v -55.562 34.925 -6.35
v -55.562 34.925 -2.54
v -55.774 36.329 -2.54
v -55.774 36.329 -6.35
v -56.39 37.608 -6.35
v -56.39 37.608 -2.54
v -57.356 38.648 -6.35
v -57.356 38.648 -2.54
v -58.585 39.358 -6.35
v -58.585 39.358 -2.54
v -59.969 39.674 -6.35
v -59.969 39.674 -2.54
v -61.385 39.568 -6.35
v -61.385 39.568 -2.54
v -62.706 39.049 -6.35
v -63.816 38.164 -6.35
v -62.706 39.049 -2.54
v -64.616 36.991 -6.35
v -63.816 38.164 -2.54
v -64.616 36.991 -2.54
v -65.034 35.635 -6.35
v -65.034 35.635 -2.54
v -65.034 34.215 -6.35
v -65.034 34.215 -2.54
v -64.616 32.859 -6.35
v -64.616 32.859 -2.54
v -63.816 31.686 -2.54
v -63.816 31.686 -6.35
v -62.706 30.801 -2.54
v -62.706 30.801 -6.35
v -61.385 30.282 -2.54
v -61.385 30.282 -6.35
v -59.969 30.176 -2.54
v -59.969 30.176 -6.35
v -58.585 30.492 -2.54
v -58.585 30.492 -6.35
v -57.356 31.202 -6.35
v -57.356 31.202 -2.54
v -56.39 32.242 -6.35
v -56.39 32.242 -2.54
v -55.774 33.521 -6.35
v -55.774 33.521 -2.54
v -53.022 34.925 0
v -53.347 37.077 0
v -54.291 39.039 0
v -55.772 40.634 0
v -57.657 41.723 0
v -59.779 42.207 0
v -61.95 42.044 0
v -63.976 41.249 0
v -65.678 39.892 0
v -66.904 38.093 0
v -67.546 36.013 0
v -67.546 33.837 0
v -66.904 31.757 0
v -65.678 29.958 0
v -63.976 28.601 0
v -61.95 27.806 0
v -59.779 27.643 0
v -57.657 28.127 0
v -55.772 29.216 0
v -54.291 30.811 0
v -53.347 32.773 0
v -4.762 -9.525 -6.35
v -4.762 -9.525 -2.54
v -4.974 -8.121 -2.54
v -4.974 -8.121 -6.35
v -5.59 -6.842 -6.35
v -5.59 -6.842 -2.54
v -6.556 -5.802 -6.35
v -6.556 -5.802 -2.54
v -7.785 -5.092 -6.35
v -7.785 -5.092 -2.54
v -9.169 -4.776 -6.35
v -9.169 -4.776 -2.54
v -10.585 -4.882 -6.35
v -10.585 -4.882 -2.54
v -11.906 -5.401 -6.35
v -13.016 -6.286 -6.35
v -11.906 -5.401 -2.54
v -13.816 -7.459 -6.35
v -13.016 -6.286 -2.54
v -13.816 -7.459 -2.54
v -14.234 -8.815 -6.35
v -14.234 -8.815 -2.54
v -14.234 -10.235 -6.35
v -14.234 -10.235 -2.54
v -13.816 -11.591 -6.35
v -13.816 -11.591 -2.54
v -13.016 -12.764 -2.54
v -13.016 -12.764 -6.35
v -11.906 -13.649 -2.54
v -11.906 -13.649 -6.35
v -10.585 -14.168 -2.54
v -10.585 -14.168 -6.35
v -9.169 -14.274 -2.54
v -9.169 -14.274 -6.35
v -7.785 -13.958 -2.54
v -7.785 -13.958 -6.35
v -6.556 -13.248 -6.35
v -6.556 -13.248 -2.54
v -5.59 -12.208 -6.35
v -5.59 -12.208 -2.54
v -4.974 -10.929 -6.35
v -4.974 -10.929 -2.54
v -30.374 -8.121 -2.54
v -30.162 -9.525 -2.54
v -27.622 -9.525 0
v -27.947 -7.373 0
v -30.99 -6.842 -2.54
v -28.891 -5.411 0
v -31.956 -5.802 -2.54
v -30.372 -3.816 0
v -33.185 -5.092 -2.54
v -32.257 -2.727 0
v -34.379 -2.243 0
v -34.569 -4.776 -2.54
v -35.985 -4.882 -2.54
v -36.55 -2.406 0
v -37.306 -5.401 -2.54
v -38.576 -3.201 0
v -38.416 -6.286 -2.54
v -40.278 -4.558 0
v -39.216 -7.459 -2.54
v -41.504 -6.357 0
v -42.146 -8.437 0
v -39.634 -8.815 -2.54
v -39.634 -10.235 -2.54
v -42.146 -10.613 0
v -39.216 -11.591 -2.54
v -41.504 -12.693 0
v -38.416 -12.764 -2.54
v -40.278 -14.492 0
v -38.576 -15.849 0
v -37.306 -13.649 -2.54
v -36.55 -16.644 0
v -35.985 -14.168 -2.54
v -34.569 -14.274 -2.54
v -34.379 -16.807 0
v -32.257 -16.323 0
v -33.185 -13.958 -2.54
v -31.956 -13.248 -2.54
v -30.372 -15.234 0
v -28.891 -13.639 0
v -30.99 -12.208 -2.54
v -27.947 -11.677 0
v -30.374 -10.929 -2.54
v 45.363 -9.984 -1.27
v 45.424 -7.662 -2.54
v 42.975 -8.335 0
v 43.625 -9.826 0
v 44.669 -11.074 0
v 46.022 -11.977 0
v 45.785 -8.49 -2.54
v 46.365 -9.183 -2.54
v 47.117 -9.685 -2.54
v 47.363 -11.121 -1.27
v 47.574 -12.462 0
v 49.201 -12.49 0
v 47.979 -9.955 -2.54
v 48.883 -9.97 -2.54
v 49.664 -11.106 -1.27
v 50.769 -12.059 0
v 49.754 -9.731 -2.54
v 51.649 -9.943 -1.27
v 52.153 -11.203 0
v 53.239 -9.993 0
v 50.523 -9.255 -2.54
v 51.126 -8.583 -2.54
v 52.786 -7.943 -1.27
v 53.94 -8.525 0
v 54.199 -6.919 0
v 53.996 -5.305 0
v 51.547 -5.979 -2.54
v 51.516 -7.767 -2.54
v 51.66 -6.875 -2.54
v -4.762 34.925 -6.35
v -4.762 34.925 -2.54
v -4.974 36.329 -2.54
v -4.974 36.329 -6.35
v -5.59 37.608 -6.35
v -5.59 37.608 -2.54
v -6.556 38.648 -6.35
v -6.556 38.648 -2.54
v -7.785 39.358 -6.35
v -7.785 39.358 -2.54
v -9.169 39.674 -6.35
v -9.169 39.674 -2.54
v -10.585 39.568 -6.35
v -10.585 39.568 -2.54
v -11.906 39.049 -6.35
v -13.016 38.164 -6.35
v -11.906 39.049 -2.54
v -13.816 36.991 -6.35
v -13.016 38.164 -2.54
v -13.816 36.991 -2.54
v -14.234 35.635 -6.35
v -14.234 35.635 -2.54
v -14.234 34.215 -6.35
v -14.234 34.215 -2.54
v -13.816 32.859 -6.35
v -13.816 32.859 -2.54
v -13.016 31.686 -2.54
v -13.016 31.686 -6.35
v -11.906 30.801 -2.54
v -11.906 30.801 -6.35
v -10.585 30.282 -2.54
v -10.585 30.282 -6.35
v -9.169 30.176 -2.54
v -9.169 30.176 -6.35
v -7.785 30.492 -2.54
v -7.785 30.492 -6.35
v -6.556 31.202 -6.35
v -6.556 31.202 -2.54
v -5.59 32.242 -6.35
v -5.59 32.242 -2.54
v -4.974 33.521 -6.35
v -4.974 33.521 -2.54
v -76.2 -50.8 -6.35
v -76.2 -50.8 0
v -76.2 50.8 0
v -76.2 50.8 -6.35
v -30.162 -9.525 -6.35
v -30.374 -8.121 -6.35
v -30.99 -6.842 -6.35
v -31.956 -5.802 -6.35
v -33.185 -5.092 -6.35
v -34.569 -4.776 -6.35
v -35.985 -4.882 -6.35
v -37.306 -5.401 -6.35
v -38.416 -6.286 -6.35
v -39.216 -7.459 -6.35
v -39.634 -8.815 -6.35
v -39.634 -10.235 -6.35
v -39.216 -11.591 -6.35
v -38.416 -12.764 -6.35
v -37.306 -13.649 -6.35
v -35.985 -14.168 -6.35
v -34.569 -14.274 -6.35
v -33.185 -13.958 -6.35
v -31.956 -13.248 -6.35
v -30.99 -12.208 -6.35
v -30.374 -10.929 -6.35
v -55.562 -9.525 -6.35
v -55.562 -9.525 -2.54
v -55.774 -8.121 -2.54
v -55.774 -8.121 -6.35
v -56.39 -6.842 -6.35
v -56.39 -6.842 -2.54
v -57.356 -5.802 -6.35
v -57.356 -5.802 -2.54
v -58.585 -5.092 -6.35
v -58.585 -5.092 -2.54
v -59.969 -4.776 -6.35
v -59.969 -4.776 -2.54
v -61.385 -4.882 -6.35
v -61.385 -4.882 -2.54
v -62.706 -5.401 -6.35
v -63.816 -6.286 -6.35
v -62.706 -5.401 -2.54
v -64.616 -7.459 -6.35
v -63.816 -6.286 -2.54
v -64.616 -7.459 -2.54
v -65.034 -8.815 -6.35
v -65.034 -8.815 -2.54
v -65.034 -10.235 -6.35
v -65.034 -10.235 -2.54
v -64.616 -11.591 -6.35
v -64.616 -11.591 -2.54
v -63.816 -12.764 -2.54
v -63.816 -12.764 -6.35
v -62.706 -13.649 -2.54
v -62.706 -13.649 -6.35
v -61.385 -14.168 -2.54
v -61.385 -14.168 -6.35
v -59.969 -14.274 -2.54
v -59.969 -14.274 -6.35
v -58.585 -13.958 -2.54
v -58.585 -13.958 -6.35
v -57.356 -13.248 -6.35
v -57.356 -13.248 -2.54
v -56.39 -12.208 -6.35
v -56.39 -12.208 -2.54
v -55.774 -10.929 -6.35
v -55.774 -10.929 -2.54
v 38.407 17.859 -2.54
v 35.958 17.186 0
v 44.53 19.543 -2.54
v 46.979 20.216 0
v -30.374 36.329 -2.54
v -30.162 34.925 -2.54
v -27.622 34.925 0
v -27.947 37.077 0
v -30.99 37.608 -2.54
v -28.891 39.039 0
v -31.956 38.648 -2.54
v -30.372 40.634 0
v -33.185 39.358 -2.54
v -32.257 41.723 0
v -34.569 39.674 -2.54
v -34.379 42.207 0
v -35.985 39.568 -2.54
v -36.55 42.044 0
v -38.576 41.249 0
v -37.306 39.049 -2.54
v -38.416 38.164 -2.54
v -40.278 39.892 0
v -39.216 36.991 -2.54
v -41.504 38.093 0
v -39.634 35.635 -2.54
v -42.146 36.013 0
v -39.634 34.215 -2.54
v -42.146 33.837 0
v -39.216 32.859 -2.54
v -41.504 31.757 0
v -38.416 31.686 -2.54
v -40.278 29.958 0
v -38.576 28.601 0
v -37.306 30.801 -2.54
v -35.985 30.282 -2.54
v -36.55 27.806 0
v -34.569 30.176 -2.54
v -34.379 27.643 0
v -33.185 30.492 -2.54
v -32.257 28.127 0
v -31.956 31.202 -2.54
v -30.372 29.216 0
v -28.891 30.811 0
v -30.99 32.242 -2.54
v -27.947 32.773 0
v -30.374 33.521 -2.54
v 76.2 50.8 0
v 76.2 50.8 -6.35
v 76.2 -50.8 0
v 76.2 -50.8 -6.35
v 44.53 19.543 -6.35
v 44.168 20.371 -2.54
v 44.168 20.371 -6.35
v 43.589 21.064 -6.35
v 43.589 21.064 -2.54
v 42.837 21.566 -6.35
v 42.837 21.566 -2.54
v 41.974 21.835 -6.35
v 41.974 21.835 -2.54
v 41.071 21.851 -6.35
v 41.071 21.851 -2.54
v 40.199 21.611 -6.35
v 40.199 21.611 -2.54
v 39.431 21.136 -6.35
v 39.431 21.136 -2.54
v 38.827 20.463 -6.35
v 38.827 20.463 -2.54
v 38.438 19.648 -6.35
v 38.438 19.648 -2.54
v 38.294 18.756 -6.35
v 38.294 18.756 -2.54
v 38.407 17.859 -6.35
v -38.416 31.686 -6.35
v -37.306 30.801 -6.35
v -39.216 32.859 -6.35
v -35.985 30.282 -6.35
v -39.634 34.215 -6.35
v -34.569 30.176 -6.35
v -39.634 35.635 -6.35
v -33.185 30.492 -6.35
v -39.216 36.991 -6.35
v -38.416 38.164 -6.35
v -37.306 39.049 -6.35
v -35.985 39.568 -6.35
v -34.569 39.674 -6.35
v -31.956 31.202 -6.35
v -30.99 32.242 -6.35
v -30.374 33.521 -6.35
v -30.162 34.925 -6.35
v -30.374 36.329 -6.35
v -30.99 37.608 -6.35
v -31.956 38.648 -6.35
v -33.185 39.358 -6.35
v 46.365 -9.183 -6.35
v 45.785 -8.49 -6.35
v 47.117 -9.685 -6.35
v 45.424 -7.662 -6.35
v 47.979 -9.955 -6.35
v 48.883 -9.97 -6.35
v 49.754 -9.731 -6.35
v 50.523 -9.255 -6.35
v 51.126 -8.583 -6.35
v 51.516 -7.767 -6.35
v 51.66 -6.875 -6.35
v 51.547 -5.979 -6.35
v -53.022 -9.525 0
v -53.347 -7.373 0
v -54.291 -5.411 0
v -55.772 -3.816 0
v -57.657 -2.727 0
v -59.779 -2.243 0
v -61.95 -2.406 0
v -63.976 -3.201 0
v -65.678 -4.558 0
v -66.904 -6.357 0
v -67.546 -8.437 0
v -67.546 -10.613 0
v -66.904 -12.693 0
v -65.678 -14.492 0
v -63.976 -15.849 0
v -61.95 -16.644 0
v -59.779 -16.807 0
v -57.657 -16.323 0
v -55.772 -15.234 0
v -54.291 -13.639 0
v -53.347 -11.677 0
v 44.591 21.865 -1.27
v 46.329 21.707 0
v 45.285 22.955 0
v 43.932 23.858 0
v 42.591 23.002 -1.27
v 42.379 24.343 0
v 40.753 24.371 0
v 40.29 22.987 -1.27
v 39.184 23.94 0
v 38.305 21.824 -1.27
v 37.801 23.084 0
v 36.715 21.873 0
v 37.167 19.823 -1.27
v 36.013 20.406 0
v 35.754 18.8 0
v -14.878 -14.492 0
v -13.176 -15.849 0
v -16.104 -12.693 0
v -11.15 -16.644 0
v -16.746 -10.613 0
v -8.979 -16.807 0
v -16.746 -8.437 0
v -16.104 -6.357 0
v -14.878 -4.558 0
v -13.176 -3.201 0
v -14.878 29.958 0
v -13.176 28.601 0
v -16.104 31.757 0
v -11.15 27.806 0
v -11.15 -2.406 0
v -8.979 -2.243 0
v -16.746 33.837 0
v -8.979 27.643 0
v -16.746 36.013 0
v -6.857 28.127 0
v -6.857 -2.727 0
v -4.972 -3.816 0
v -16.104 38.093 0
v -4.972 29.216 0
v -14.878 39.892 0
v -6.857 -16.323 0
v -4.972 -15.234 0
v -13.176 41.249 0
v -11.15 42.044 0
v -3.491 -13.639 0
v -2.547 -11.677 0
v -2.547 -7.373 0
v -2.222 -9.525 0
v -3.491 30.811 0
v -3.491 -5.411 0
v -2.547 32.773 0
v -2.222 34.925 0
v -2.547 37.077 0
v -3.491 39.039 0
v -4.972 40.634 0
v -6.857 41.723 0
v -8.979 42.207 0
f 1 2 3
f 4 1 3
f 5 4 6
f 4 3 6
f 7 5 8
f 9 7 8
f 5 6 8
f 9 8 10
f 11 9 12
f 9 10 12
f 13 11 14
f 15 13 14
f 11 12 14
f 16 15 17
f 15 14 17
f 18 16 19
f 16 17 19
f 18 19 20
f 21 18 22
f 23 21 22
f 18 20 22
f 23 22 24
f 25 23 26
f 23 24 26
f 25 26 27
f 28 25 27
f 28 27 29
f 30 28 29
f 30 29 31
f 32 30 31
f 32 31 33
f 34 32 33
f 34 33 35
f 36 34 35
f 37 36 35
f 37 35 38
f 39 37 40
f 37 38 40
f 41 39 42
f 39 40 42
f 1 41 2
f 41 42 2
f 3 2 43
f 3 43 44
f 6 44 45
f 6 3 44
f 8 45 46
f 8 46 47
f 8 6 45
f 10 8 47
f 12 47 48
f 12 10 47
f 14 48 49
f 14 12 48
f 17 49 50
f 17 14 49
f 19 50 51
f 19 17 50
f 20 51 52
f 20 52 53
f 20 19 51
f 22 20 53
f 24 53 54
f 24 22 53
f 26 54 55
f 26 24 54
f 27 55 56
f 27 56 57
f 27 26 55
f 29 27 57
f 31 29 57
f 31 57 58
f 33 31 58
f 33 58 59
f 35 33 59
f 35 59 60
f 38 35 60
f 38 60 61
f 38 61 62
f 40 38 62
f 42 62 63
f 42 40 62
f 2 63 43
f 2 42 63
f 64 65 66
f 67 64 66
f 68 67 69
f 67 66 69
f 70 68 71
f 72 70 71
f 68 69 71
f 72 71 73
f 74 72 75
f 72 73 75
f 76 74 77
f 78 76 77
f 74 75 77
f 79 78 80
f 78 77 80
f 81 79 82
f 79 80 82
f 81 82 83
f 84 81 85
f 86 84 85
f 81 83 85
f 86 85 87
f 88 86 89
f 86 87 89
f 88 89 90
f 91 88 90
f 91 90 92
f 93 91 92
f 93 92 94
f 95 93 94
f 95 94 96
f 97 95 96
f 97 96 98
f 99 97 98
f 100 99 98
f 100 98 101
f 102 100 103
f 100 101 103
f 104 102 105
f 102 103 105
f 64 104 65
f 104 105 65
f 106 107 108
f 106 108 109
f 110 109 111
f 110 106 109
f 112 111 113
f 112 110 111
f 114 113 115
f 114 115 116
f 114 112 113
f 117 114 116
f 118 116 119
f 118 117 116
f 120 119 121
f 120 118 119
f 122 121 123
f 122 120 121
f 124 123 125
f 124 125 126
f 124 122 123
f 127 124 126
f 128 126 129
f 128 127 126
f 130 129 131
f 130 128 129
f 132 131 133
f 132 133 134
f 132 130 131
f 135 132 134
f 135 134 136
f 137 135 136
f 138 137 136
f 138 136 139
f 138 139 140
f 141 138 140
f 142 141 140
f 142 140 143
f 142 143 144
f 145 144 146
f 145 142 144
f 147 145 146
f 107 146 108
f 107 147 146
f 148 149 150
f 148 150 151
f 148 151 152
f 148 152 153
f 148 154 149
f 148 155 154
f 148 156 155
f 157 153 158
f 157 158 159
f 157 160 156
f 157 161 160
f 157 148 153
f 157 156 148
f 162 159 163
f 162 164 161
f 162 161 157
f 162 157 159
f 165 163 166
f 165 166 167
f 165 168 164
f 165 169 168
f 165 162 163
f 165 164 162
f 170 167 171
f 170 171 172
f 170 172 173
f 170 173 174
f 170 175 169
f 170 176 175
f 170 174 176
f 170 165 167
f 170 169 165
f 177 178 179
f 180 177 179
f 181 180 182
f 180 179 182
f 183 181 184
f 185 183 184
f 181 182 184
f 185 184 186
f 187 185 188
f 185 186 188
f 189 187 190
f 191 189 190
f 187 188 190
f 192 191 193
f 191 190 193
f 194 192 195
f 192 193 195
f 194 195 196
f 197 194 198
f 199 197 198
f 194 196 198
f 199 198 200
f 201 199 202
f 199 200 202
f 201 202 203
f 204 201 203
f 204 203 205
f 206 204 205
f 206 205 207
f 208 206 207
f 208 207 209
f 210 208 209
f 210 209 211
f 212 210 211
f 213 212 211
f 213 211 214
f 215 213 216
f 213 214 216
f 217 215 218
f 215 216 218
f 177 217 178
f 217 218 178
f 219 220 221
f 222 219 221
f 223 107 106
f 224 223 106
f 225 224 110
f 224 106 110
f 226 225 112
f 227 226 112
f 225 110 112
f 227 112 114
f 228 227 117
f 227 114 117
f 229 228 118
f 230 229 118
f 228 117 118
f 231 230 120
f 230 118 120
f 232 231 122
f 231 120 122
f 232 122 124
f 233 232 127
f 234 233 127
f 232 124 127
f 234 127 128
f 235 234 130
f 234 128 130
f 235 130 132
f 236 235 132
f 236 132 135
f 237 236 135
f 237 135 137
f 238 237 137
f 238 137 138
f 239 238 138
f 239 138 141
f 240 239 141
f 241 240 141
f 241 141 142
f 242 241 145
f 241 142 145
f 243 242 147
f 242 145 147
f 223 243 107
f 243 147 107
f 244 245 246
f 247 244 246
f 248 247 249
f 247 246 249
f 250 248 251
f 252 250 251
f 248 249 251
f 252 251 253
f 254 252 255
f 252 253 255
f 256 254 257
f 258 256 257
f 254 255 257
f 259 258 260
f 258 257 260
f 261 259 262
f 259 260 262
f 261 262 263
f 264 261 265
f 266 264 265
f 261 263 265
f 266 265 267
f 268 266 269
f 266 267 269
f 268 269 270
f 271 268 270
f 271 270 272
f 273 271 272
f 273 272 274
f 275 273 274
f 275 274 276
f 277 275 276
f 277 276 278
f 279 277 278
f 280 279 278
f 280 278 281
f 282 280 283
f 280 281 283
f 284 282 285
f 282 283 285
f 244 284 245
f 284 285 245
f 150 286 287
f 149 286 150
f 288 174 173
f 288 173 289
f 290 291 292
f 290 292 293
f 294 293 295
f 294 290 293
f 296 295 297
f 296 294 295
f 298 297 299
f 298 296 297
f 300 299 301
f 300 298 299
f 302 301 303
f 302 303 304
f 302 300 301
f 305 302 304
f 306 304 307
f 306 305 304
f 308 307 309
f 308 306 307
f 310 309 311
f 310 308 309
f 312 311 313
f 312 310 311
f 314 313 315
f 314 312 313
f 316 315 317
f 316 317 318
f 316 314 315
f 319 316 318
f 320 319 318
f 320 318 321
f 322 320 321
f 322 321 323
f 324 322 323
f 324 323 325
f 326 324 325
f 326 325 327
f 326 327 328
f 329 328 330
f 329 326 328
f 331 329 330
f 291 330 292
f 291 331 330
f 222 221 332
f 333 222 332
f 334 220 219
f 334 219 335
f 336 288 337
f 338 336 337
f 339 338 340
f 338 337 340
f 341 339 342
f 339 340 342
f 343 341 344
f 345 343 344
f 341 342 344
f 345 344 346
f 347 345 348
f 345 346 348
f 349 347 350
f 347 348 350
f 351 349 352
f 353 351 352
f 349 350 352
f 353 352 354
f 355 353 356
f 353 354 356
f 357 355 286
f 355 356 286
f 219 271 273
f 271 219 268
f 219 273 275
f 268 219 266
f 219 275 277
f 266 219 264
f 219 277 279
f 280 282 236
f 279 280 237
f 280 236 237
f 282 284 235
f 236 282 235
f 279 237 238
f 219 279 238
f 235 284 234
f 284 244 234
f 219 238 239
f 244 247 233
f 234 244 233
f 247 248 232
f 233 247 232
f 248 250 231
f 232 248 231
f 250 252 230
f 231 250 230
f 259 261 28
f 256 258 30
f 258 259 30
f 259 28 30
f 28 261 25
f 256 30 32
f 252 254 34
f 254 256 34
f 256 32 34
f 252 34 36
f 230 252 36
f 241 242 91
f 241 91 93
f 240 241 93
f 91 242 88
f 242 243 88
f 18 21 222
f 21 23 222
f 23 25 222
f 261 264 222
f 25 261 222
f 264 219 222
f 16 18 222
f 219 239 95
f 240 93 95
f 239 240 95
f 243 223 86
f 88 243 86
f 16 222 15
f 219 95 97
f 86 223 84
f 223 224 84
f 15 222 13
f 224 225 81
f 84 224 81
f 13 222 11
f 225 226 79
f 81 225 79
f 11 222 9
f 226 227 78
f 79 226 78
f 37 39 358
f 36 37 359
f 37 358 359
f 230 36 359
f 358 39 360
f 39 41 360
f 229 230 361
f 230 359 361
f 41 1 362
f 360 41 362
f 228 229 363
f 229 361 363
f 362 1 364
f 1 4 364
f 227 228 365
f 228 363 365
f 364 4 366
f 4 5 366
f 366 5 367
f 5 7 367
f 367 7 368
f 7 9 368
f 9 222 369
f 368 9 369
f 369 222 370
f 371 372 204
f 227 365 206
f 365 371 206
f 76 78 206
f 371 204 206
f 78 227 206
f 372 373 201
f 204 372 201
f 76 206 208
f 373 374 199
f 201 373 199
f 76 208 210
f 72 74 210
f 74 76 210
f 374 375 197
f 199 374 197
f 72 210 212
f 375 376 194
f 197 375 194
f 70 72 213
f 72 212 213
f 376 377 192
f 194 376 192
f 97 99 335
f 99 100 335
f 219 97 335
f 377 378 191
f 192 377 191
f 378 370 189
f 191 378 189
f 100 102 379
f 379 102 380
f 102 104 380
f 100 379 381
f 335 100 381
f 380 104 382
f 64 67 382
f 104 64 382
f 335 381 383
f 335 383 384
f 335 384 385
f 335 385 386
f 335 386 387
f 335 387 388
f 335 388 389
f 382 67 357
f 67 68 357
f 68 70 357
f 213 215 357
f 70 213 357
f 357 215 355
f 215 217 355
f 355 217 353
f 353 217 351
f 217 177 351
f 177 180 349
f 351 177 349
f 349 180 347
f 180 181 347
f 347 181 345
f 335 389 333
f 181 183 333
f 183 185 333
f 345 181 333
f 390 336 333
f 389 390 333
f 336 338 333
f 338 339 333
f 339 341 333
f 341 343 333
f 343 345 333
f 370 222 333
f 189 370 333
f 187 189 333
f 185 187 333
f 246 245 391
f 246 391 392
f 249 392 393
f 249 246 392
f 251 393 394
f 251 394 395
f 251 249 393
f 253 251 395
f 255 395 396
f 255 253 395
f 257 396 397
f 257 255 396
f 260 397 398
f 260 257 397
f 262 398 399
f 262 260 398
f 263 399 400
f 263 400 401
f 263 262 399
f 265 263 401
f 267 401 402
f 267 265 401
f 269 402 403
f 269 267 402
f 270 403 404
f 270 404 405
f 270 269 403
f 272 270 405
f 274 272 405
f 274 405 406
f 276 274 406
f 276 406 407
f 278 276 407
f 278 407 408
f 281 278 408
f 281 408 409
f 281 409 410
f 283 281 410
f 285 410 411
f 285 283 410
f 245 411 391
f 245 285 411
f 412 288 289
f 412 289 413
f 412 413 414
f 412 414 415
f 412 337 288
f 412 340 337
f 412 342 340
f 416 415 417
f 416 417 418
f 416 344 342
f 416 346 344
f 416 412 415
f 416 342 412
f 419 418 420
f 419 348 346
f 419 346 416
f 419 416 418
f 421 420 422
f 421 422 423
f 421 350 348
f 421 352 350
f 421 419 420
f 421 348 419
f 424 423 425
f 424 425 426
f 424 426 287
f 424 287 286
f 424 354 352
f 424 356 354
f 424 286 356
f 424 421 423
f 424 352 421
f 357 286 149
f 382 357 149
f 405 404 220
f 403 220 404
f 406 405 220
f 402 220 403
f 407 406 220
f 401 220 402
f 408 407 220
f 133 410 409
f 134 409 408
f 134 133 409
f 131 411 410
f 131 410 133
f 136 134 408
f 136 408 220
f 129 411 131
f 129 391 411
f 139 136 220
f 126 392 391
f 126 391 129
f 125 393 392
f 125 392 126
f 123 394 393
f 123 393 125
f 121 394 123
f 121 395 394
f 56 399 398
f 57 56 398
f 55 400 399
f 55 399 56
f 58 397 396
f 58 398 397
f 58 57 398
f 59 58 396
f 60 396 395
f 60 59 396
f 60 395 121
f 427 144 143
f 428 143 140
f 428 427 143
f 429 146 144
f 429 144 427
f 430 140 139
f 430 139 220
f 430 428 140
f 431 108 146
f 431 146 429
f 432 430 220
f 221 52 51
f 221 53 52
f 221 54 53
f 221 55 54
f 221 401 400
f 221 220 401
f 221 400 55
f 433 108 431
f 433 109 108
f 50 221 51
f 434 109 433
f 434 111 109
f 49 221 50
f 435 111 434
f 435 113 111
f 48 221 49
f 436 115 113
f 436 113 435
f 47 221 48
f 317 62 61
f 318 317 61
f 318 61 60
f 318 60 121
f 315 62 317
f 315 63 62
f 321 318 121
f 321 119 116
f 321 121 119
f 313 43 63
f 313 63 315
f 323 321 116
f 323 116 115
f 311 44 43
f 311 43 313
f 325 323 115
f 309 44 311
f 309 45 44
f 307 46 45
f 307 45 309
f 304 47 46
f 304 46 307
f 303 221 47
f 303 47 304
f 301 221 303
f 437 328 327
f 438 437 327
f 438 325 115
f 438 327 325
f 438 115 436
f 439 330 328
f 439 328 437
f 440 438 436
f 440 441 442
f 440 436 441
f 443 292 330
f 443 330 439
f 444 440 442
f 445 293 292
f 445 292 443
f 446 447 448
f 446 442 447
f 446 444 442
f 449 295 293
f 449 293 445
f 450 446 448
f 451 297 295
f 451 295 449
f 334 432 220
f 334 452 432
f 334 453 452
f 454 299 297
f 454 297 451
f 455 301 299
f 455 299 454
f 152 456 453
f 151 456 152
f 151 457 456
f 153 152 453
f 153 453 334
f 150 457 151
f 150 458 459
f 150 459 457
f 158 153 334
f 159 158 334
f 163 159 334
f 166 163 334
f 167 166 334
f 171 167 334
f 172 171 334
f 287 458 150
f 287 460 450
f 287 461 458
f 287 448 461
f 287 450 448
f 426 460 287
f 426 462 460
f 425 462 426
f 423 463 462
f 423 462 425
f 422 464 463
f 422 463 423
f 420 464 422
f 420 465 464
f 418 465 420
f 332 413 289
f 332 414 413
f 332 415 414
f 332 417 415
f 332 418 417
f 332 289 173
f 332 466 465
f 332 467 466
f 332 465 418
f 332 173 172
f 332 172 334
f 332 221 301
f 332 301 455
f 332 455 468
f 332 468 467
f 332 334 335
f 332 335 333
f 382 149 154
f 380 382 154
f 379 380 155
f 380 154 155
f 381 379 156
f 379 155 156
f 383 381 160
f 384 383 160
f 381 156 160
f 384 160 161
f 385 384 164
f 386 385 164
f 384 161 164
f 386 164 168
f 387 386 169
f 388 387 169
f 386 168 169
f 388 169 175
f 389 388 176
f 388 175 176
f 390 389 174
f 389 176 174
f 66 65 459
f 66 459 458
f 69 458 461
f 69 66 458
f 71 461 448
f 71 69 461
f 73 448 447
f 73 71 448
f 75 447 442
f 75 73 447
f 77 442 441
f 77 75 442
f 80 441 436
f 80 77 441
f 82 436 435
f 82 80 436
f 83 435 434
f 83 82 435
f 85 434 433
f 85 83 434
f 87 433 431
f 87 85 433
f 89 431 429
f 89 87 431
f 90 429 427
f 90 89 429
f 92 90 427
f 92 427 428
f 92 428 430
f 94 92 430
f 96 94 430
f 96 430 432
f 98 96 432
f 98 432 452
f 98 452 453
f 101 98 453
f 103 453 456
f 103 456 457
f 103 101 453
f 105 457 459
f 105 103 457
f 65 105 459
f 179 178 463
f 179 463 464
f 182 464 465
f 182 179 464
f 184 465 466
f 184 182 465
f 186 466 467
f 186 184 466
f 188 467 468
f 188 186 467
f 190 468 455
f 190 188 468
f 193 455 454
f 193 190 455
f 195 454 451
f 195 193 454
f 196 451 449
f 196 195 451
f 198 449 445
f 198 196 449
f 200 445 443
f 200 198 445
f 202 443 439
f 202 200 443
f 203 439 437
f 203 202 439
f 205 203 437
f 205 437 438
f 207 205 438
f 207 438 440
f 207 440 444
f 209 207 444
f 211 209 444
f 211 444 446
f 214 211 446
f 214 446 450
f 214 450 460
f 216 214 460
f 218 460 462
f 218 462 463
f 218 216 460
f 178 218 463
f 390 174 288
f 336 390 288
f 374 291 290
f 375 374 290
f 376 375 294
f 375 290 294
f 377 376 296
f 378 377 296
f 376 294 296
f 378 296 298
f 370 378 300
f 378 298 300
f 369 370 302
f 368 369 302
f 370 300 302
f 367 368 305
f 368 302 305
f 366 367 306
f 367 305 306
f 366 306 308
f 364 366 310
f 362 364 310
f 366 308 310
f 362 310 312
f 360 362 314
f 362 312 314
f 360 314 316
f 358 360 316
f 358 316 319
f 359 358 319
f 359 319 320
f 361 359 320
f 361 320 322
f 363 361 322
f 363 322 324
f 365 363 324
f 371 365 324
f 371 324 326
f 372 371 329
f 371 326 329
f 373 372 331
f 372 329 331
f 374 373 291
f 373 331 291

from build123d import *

# Parameters (mm, degrees)
F0_W     = 152.4
F0_H     = 101.6
F0_R     = 4.7625
F2_DEPTH = 6.35
F3_DEPTH = 25.4
F4_SIZE  = 2.54


with BuildPart() as f2:
    # F0 (on Top) → F2 (new body)
    with BuildSketch(Plane.XY):
        Rectangle(F0_W, F0_H)
        with Locations((-60.325, -9.525)):
            Circle(F0_R, mode=Mode.SUBTRACT)
        with Locations((-34.925, -9.525)):
            Circle(F0_R, mode=Mode.SUBTRACT)
        with Locations((-9.525, -9.525)):
            Circle(F0_R, mode=Mode.SUBTRACT)
        with Locations((-60.325, 34.925)):
            Circle(F0_R, mode=Mode.SUBTRACT)
        with Locations((-34.925, 34.925)):
            Circle(F0_R, mode=Mode.SUBTRACT)
        with Locations((-9.525, 34.925)):
            Circle(F0_R, mode=Mode.SUBTRACT)
    extrude(amount=-F2_DEPTH)

    # F1 (on face) → F3 (cut)
    with BuildSketch(Plane.XY):
        with BuildLine():
            Line((51.546737, -5.978524), (44.529635, 19.542772))
            ThreePointArc((44.529635, 19.542772), (40.626513, 21.762431), (38.406854, 17.859308))
            Line((38.406854, 17.859308), (45.423956, -7.661988))
            ThreePointArc((45.423956, -7.661988), (49.327078, -9.881647), (51.546737, -5.978524))
        make_face()
    extrude(amount=-F3_DEPTH, mode=Mode.SUBTRACT)

    # F4
    f4_edges = [f2.edges().sort_by_distance(p)[0] for p in [
        (-65.0875, 34.925, 0),
        (-39.6875, 34.925, 0),
        (-14.2875, 34.925, 0),
        (-14.2875, -9.525, 0),
        (-39.6875, -9.525, 0),
        (-65.0875, -9.525, 0),
        (41.915405, 5.09866, 0),
    ]]
    chamfer(f4_edges, length=F4_SIZE)


solid = f2.part
